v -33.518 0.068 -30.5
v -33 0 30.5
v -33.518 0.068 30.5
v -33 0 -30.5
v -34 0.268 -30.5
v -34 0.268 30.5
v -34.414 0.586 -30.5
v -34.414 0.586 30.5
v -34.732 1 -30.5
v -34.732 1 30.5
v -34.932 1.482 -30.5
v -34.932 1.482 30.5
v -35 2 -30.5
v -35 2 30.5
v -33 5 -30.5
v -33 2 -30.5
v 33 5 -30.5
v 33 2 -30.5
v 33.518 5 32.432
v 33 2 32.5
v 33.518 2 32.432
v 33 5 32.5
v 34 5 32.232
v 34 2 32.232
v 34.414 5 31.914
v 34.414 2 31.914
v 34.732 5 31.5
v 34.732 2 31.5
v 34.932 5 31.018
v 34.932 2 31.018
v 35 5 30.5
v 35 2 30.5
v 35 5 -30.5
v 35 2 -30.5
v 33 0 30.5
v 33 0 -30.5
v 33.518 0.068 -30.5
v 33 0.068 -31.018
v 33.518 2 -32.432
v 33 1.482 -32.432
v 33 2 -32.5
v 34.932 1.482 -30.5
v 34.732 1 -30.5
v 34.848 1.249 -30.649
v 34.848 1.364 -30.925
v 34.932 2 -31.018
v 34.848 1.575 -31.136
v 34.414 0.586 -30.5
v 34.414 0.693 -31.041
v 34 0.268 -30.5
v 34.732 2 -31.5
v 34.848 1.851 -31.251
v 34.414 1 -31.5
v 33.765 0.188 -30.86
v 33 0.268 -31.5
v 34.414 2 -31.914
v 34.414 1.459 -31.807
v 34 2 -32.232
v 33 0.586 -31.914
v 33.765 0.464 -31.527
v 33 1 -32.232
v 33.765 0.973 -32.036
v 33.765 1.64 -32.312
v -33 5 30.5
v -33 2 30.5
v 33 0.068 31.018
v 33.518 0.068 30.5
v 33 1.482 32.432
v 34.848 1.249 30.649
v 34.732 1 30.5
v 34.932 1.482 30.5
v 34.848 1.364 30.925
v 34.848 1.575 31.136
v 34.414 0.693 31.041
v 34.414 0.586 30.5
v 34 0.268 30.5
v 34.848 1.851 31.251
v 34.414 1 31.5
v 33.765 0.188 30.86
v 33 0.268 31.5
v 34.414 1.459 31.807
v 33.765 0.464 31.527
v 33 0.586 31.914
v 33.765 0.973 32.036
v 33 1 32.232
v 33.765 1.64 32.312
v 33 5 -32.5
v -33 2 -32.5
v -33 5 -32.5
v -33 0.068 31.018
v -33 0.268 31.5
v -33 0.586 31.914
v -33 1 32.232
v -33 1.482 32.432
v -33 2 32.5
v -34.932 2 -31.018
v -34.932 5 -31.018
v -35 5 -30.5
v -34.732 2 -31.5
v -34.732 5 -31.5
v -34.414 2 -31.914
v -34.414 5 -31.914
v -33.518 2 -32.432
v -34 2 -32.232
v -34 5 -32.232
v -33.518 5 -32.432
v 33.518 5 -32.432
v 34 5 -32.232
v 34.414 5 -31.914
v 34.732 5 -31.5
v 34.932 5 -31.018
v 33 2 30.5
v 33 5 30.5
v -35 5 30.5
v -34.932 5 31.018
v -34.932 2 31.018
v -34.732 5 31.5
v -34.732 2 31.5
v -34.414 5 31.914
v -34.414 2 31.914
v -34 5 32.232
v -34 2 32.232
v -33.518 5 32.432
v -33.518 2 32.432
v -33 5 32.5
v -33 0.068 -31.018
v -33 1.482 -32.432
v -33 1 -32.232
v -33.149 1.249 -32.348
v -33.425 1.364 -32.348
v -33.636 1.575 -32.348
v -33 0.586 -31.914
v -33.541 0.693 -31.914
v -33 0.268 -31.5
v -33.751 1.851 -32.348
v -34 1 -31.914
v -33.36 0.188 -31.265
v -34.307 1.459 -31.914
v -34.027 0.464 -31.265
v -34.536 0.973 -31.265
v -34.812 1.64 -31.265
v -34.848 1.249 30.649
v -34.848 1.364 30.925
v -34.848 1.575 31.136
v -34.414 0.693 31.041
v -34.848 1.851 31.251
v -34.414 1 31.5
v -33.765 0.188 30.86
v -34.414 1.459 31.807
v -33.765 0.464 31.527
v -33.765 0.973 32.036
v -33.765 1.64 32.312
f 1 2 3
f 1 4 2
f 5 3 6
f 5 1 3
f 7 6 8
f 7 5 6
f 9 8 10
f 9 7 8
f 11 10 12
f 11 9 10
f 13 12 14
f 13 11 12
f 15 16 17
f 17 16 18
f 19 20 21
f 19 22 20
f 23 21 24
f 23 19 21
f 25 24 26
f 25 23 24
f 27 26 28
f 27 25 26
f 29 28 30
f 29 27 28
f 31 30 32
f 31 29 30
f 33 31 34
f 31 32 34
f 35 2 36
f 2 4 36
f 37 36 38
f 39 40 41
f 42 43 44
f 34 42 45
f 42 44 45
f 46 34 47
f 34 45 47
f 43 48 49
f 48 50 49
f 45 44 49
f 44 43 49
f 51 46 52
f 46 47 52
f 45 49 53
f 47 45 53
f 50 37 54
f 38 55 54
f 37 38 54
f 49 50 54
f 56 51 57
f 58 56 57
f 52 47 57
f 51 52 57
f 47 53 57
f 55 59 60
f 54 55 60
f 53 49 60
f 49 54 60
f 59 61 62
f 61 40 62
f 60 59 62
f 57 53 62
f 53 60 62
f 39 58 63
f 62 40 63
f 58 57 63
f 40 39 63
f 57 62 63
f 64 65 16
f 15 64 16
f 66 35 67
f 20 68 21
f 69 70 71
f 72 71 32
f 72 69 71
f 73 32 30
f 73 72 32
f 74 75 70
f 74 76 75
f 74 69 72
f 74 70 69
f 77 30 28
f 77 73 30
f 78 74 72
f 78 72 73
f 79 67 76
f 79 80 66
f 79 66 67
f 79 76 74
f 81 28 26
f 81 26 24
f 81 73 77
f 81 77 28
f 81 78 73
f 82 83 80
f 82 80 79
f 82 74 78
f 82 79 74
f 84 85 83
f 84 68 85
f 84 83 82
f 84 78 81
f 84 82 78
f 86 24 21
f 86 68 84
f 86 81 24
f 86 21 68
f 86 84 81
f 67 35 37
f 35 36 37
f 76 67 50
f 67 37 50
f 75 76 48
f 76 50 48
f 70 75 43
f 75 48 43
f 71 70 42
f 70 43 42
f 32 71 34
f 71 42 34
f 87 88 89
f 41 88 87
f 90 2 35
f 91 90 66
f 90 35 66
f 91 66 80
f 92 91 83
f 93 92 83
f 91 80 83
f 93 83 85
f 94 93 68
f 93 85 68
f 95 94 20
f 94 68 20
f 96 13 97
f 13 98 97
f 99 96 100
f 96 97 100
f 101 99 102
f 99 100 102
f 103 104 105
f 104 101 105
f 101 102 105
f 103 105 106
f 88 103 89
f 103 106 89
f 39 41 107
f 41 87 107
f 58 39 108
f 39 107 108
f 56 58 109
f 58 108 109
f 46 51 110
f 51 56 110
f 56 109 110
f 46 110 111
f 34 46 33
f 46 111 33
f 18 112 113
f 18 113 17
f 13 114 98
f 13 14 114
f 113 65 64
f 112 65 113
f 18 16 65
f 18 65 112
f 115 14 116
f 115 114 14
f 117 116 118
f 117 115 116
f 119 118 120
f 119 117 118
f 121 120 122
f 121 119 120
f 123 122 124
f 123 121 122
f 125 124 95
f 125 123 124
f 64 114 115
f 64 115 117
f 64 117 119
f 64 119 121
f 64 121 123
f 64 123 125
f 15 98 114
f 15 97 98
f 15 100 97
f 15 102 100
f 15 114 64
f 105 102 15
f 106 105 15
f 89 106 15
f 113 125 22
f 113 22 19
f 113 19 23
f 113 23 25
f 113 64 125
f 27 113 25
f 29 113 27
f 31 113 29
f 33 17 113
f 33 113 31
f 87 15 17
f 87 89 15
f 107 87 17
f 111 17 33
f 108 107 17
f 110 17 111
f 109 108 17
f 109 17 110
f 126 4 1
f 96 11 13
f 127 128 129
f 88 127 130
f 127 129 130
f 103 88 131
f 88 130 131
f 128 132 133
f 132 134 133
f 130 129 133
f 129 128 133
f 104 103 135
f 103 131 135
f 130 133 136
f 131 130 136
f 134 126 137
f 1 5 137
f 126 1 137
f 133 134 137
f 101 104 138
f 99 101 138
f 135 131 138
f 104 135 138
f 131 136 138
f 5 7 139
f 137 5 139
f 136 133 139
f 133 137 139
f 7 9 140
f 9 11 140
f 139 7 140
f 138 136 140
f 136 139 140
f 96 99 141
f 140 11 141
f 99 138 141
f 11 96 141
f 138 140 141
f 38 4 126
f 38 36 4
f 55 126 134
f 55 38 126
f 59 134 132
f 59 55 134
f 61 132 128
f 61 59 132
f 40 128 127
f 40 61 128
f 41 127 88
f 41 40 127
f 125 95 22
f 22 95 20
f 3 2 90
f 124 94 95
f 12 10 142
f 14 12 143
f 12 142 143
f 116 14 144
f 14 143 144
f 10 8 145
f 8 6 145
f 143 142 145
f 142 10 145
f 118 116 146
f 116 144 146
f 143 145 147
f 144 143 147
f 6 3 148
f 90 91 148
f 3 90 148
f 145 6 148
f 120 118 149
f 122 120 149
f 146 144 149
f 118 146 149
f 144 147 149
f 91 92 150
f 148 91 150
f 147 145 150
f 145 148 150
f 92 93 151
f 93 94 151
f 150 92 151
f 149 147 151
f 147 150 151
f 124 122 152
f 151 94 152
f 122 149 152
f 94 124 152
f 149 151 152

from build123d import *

# Parameters (mm, degrees)
SKETCH1_W           = 70
SKETCH1_H           = 65
SKETCH1_W_2         = 66
SKETCH1_H_2         = 61
BOSS_EXTRUDE1_DEPTH = 5
SKETCH2_W           = 66
SKETCH2_H           = 61
BOSS_EXTRUDE2_DEPTH = 2
FILLET2_R           = 2


with BuildPart() as part:
    # Sketch1 → Boss-Extrude1 (new body)
    with BuildSketch(Plane(origin=(0, 0, 0), x_dir=(1, 0, 0), z_dir=(0, 1, 0))):
        Rectangle(SKETCH1_W, SKETCH1_H)
        Rectangle(SKETCH1_W_2, SKETCH1_H_2, mode=Mode.SUBTRACT)
    extrude(amount=BOSS_EXTRUDE1_DEPTH)

    # Sketch2 → Boss-Extrude2 (add)
    with BuildSketch(Plane(origin=(0, 0, 0), x_dir=(1, 0, 0), z_dir=(0, 1, 0))):
        Rectangle(SKETCH2_W, SKETCH2_H)
    extrude(amount=BOSS_EXTRUDE2_DEPTH)

    # Fillet2
    fillet2_edges = [part.edges().sort_by_distance(p)[0] for p in [
        (0, 0, 32.5),
        (-35, 0, 0),
        (0, 0, -32.5),
        (35, 0, 0),
        (35, 2.5, 32.5),
        (-35, 2.5, 32.5),
        (-35, 2.5, -32.5),
        (35, 2.5, -32.5),
    ]]
    fillet(fillet2_edges, radius=FILLET2_R)


solid = part.part
